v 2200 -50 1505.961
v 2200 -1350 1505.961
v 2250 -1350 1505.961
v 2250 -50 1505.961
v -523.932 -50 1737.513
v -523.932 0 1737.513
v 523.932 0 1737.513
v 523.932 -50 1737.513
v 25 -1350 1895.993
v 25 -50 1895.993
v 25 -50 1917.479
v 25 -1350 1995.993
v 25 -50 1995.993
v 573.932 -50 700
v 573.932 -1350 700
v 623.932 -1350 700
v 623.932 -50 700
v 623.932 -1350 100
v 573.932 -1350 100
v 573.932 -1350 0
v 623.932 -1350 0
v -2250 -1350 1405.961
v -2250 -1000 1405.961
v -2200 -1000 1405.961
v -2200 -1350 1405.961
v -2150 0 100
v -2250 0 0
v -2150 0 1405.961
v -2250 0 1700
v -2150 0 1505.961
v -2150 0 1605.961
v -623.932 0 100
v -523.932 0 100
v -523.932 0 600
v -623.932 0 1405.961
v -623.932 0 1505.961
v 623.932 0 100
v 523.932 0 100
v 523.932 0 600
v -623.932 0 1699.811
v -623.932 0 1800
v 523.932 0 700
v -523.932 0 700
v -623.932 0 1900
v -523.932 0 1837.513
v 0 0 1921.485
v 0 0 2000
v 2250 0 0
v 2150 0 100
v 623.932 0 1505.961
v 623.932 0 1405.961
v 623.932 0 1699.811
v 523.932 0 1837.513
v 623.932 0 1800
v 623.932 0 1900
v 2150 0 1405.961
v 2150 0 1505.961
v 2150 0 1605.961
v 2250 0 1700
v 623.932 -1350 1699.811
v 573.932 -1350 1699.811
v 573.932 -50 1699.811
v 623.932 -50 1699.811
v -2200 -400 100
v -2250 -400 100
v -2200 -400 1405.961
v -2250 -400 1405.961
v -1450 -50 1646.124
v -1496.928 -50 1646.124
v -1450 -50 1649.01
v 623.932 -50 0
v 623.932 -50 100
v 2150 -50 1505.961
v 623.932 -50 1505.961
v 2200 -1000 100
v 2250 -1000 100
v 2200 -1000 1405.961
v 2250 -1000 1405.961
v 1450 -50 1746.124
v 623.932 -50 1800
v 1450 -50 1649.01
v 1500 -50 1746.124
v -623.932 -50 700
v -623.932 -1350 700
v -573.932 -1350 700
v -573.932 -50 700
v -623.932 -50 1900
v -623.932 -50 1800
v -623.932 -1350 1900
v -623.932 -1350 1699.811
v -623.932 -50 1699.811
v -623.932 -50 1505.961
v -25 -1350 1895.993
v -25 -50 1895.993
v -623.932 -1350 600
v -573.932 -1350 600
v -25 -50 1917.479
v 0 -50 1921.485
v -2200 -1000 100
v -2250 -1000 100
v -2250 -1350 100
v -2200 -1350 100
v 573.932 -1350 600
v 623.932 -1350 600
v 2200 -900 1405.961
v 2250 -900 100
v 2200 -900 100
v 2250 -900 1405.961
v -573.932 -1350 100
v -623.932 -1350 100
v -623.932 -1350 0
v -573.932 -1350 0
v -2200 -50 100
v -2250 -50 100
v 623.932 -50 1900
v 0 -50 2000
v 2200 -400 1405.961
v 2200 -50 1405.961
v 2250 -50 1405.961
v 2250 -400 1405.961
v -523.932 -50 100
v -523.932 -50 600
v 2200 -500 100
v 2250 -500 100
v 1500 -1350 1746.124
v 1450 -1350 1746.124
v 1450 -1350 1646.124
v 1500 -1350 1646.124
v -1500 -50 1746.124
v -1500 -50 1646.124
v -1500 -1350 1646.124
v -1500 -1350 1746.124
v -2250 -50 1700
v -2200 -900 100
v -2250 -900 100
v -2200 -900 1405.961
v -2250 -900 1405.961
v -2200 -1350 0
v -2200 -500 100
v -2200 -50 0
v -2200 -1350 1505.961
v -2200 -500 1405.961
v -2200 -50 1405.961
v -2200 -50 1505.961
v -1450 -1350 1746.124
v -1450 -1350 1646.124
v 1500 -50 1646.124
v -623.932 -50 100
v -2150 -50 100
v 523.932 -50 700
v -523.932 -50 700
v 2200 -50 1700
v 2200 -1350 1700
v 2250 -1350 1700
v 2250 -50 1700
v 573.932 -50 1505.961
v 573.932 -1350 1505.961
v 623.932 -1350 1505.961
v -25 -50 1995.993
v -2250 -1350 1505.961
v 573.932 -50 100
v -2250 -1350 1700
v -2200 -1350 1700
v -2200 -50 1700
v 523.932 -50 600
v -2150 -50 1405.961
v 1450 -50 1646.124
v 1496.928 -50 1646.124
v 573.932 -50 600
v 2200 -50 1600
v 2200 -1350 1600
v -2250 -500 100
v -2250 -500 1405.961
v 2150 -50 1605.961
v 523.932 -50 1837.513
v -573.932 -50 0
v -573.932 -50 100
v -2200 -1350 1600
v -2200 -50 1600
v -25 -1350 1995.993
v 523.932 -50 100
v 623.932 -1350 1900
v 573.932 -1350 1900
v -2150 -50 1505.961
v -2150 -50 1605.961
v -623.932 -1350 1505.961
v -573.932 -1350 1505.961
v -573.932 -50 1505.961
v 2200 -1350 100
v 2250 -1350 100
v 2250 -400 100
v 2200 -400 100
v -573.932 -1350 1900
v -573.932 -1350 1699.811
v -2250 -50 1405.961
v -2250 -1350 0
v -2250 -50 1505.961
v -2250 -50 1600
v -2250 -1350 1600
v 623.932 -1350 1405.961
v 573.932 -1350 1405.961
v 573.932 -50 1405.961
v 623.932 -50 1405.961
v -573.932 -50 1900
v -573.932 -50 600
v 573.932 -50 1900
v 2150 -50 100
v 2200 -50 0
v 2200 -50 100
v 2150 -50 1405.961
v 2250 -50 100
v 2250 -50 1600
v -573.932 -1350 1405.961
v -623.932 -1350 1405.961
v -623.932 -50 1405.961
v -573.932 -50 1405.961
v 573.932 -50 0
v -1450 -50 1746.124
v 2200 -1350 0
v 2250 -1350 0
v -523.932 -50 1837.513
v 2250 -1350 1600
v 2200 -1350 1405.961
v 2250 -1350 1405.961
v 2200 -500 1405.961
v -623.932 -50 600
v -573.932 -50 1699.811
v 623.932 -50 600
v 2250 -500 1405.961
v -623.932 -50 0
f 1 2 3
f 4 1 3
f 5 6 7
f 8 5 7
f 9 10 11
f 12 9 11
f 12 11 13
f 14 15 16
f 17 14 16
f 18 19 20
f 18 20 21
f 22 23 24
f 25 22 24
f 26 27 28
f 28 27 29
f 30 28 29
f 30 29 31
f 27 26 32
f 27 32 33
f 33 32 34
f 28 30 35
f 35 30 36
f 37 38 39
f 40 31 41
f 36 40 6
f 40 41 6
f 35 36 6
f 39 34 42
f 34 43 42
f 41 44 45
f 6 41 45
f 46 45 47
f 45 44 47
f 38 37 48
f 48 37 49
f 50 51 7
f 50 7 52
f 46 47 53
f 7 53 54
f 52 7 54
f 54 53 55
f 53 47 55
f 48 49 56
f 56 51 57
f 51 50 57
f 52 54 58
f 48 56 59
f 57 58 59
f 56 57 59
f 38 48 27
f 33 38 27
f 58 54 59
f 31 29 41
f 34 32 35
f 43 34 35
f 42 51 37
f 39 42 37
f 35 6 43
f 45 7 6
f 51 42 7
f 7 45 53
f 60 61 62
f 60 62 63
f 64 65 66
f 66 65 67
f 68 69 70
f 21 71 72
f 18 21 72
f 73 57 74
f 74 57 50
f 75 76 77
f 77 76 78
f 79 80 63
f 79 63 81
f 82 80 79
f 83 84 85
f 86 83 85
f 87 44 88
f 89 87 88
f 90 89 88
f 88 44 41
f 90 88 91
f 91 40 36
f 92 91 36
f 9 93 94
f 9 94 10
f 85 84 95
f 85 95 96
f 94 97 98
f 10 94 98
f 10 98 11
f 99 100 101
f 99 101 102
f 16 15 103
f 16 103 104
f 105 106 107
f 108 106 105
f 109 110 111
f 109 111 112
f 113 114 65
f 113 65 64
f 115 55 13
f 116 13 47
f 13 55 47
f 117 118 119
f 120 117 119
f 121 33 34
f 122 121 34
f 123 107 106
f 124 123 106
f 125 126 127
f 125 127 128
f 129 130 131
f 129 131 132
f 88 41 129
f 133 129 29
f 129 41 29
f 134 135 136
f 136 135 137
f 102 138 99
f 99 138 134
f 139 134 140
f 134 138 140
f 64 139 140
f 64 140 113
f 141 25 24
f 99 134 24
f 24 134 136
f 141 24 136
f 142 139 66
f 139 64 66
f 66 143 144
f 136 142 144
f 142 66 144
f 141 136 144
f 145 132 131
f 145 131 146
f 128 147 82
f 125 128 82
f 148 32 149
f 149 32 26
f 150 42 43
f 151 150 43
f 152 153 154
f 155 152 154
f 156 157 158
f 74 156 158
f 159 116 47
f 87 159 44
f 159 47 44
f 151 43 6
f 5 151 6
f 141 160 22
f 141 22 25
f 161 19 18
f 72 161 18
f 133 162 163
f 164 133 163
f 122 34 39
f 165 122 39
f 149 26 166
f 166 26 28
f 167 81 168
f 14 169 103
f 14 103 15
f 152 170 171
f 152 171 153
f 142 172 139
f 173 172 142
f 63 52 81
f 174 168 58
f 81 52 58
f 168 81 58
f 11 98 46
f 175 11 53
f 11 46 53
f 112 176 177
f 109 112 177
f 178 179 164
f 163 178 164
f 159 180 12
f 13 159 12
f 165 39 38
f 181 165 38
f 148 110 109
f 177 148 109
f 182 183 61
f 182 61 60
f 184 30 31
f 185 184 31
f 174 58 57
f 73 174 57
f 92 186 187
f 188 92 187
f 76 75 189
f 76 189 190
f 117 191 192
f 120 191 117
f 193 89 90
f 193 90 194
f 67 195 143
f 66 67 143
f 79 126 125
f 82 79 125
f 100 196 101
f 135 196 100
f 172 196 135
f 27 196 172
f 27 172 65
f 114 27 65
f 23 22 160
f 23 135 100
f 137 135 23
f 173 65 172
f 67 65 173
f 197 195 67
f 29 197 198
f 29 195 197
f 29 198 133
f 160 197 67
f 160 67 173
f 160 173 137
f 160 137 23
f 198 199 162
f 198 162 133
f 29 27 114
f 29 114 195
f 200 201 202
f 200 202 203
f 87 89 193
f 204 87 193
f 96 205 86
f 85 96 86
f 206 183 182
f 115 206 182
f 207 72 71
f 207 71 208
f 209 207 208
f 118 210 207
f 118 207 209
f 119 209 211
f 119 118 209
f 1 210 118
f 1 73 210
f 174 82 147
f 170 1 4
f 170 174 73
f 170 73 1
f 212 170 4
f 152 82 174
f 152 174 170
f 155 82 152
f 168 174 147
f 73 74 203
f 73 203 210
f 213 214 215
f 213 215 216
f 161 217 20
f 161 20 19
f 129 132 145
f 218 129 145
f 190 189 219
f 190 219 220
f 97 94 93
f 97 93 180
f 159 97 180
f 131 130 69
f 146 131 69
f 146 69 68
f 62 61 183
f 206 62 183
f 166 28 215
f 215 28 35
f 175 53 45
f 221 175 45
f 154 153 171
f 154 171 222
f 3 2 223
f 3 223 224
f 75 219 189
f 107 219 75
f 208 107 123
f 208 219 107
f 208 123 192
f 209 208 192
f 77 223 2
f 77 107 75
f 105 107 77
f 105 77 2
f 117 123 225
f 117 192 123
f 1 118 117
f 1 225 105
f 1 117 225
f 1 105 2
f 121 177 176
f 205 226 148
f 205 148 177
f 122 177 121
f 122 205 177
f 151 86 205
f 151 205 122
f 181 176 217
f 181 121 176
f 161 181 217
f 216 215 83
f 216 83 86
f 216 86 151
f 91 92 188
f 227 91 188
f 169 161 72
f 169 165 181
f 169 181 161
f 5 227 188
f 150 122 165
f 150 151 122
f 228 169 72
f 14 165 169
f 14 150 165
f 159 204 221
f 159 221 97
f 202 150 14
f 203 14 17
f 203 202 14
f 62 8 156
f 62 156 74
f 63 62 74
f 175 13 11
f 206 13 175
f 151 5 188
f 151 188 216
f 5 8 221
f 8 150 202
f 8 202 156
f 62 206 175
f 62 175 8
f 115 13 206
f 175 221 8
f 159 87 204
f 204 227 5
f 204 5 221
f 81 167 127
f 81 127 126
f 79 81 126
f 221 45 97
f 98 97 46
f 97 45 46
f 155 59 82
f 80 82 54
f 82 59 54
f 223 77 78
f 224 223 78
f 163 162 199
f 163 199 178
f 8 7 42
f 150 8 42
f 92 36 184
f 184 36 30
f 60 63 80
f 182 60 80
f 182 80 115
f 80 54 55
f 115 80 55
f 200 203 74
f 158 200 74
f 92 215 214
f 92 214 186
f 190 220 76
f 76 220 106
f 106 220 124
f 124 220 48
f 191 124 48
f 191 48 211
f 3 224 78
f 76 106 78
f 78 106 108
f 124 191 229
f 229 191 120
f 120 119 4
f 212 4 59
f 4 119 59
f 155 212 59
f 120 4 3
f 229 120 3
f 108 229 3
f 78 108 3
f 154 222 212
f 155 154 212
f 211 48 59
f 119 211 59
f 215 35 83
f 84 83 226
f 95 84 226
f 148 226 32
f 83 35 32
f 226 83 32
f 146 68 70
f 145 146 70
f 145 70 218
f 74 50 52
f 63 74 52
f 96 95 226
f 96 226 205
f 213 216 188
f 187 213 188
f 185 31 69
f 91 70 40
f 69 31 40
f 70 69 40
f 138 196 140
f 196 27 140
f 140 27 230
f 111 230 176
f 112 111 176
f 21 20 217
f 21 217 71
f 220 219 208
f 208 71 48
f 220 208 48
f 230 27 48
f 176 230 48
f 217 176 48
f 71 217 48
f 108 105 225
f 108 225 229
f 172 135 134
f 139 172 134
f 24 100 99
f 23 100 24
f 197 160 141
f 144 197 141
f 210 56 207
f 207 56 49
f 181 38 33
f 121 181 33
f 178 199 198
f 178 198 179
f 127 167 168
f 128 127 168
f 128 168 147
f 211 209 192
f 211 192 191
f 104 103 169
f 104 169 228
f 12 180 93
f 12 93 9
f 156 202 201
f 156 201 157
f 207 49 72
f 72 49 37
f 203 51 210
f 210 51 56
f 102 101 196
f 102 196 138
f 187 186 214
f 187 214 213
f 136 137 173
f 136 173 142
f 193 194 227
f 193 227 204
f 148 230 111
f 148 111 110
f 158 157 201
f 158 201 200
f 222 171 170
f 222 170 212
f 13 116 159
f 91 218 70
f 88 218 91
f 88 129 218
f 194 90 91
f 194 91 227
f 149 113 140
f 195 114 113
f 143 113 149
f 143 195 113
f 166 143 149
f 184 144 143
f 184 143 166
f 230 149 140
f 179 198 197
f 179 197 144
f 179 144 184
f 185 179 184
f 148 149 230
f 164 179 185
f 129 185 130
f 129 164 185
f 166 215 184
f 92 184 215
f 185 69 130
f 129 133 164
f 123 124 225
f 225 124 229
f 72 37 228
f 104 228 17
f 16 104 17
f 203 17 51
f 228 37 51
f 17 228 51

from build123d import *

# Parameters (mm, degrees)
F1_DEPTH = 50
F2_W     = 50
F2_H     = 100
F2_H_2   = 200.1889220677
F3_DEPTH = 1300
F4_W     = 100
F4_H     = 1305.9608832205
F5_DEPTH = 50
F6_W     = 100
F6_H     = 1305.9608832205
F7_DEPTH = 50


with BuildPart() as f1:
    # F0 (on Front) → F1 (new body)
    with BuildSketch(Plane.XZ):
        Polygon((-2250, 0), (0, 0), (2250, 0), (2250, 1700), (623.9322577896, 1800), (623.9322577896, 1900), (0, 2000), (-623.9322577896, 1900), (-623.9322577896, 1800), (-2250, 1700), align=None)
        Polygon((-2150, 1405.9608832205), (-623.9322577896, 1405.9608832205), (-623.9322577896, 600), (-623.9322577896, 100), (-2150, 100), align=None, mode=Mode.SUBTRACT)
        Polygon((0, 600), (523.9322577896, 600), (523.9322577896, 100), (0, 100), (-523.9322577896, 100), (-523.9322577896, 600), align=None, mode=Mode.SUBTRACT)
        Polygon((2150, 1405.9608832205), (2150, 100), (623.9322577896, 100), (623.9322577896, 600), (623.9322577896, 1405.9608832205), align=None, mode=Mode.SUBTRACT)
        Polygon((-623.9322577896, 1505.9608832205), (-2150, 1505.9608832205), (-2150, 1605.9608832205), (-623.9322577896, 1699.8110779323), align=None, mode=Mode.SUBTRACT)
        Polygon((-523.9322577896, 1737.5128050197), (523.9322577896, 1737.5128050197), (523.9322577896, 700), (0, 700), (-523.9322577896, 700), align=None, mode=Mode.SUBTRACT)
        Polygon((-523.9322577896, 1837.5128050197), (0, 1921.4854240417), (523.9322577896, 1837.5128050197), align=None, mode=Mode.SUBTRACT)
        Polygon((623.9322577896, 1505.9608832205), (623.9322577896, 1699.8110779323), (2150, 1605.9608832205), (2150, 1505.9608832205), align=None, mode=Mode.SUBTRACT)
    extrude(amount=F1_DEPTH)

    # F2 (on face) → F3 (join)
    with BuildSketch(Plane.XZ.offset(50)):
        with Locations((-2225, 50)):
            Rectangle(F2_W, F2_H)
        with Locations((-2225, 1650)):
            Rectangle(F2_W, F2_H)
        with Locations((-2225, 1455.9608832205)):
            Rectangle(F2_W, F2_H)
        with Locations((-598.9322577896, 1455.9608832205)):
            Rectangle(F2_W, F2_H)
        with Locations((-598.9322577896, 1799.9055389662)):
            Rectangle(F2_W, F2_H_2)
        with Locations((-1475, 1696.1235396614)):
            Rectangle(F2_W, F2_H)
        with Locations((-598.9322577896, 650)):
            Rectangle(F2_W, F2_H)
        with Locations((-598.9322577896, 50)):
            Rectangle(F2_W, F2_H)
        with Locations((0, 1945.9931547555)):
            Rectangle(F2_W, F2_H)
        with Locations((2225, 1650)):
            Rectangle(F2_W, F2_H)
        with Locations((598.9322577896, 1455.9608832205)):
            Rectangle(F2_W, F2_H)
        with Locations((598.9322577896, 1799.9055389662)):
            Rectangle(F2_W, F2_H_2)
        with Locations((598.9322577896, 50)):
            Rectangle(F2_W, F2_H)
        with Locations((1475, 1696.1235396614)):
            Rectangle(F2_W, F2_H)
        with Locations((598.9322577896, 650)):
            Rectangle(F2_W, F2_H)
        with Locations((2225, 1455.9608832205)):
            Rectangle(F2_W, F2_H)
        with Locations((2225, 50)):
            Rectangle(F2_W, F2_H)
    extrude(amount=F3_DEPTH)

    # F4 (on face) → F5 (join)
    with BuildSketch(Plane(origin=(-2250, 0, 0), x_dir=(0, -1, 0), z_dir=(-1, 0, 0))):
        with Locations((450, 752.9804416103)):
            Rectangle(F4_W, F4_H)
        with Locations((950, 752.9804416103)):
            Rectangle(F4_W, F4_H)
    extrude(amount=-F5_DEPTH)

    # F6 (on face) → F7 (join)
    with BuildSketch(Plane.YZ.offset(2250)):
        with Locations((-950, 752.9804416103)):
            Rectangle(F6_W, F6_H)
        with Locations((-450, 752.9804416103)):
            Rectangle(F6_W, F6_H)
    extrude(amount=-F7_DEPTH)


solid = f1.part
